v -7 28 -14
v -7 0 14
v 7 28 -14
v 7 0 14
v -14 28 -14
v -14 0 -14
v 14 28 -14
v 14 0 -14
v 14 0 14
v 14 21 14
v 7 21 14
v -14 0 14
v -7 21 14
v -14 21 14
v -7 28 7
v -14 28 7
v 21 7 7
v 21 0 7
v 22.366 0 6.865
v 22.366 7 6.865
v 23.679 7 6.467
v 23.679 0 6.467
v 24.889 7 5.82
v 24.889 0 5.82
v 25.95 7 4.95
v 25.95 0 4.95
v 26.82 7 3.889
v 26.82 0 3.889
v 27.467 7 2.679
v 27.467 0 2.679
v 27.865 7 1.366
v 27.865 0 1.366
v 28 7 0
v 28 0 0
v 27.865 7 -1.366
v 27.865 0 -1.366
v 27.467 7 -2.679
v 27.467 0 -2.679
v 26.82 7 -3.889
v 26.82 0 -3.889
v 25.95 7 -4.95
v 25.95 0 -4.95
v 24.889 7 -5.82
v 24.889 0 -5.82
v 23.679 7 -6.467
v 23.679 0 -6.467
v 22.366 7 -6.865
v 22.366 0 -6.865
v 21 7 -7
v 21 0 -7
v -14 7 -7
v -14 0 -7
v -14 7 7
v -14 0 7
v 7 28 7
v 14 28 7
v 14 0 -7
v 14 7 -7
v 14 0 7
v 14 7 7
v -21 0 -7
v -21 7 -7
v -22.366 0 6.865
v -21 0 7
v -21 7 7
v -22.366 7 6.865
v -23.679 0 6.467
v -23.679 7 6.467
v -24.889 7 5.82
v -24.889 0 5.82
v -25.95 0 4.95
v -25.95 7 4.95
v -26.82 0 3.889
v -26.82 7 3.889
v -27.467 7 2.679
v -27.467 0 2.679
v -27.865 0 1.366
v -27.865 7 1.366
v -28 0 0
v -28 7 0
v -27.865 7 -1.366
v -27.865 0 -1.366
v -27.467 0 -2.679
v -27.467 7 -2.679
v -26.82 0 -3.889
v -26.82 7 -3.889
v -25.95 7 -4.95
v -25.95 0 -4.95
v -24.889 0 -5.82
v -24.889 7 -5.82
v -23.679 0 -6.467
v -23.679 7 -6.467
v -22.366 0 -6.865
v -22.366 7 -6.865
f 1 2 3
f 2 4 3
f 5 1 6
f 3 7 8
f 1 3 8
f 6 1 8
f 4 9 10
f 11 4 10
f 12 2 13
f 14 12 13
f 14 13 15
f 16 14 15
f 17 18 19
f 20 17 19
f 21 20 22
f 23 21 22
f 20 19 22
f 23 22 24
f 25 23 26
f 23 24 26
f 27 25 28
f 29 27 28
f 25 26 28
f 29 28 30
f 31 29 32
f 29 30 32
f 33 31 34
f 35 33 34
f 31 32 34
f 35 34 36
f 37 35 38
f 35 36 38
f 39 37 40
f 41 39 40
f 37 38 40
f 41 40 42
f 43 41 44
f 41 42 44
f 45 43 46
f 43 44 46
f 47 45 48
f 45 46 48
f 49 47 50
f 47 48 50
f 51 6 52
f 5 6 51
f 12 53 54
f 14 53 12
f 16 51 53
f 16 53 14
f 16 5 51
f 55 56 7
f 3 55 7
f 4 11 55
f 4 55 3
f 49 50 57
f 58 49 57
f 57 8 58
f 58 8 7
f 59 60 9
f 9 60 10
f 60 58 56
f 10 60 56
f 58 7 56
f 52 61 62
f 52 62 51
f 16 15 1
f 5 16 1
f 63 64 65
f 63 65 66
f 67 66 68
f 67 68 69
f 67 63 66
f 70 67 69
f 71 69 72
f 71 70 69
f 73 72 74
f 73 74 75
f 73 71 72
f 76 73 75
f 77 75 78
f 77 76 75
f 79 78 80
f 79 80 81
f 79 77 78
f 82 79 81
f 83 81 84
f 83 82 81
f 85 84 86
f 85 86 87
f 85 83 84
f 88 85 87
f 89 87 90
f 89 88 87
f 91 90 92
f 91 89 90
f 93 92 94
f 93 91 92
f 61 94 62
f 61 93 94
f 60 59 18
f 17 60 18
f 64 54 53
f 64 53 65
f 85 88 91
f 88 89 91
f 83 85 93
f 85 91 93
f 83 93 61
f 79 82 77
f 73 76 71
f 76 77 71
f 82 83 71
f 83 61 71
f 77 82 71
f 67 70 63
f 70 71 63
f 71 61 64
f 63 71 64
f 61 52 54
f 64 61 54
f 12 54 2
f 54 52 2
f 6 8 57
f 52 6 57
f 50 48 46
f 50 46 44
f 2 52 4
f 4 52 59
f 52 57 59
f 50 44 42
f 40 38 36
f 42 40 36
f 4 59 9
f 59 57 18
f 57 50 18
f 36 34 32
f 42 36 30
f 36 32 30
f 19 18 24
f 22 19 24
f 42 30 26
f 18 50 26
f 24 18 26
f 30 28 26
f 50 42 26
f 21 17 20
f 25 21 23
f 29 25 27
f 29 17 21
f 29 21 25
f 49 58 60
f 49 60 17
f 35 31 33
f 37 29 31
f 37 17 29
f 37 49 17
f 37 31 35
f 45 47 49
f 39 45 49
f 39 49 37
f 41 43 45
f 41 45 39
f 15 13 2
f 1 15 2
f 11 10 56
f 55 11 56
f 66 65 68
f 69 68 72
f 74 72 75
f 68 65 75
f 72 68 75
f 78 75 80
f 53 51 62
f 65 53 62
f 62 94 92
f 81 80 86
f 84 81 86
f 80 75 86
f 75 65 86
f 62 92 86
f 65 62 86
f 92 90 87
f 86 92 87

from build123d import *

# Parameters (mm, degrees)
EXTRUDE_1_DEPTH     = 14
CUT_EXTRUDE_1_DEPTH = 7
EXTRUDE_2_DEPTH     = 7


with BuildPart() as part:
    # 스케치1 → 보스-돌출1 (new body, symmetric)
    with BuildSketch(Plane(origin=(0, 0, 0), x_dir=(0, 0, -1), z_dir=(1, 0, 0))):
        Polygon((14, 0), (-14, 0), (-14, 21), (-7, 28), (14, 28), align=None)
    extrude(amount=EXTRUDE_1_DEPTH, both=True)

    # 스케치2 → 컷-돌출1 (cut, symmetric)
    with BuildSketch(Plane(origin=(0, 0, 0), x_dir=(0, 0, -1), z_dir=(1, 0, 0))):
        Polygon((-14, 0), (14, 28), (-14, 28), align=None)
    extrude(amount=CUT_EXTRUDE_1_DEPTH, both=True, mode=Mode.SUBTRACT)

    # 스케치3 → 보스-돌출2 (add)
    with BuildSketch(Plane(origin=(0, 0, 0), x_dir=(1, 0, 0), z_dir=(0, 1, 0))):
        with BuildLine():
            Line((-21, 7), (-14, 7))
            Line((-14, 7), (-14, -7))
            Line((-14, -7), (-21, -7))
            ThreePointArc((-21, -7), (-28, 0), (-21, 7))
        make_face()
        with BuildLine():
            Line((14, 7), (14, -7))
            Line((14, -7), (21, -7))
            ThreePointArc((21, -7), (28, 0), (21, 7))
            Line((21, 7), (14, 7))
        make_face()
    extrude(amount=EXTRUDE_2_DEPTH)


solid = part.part
